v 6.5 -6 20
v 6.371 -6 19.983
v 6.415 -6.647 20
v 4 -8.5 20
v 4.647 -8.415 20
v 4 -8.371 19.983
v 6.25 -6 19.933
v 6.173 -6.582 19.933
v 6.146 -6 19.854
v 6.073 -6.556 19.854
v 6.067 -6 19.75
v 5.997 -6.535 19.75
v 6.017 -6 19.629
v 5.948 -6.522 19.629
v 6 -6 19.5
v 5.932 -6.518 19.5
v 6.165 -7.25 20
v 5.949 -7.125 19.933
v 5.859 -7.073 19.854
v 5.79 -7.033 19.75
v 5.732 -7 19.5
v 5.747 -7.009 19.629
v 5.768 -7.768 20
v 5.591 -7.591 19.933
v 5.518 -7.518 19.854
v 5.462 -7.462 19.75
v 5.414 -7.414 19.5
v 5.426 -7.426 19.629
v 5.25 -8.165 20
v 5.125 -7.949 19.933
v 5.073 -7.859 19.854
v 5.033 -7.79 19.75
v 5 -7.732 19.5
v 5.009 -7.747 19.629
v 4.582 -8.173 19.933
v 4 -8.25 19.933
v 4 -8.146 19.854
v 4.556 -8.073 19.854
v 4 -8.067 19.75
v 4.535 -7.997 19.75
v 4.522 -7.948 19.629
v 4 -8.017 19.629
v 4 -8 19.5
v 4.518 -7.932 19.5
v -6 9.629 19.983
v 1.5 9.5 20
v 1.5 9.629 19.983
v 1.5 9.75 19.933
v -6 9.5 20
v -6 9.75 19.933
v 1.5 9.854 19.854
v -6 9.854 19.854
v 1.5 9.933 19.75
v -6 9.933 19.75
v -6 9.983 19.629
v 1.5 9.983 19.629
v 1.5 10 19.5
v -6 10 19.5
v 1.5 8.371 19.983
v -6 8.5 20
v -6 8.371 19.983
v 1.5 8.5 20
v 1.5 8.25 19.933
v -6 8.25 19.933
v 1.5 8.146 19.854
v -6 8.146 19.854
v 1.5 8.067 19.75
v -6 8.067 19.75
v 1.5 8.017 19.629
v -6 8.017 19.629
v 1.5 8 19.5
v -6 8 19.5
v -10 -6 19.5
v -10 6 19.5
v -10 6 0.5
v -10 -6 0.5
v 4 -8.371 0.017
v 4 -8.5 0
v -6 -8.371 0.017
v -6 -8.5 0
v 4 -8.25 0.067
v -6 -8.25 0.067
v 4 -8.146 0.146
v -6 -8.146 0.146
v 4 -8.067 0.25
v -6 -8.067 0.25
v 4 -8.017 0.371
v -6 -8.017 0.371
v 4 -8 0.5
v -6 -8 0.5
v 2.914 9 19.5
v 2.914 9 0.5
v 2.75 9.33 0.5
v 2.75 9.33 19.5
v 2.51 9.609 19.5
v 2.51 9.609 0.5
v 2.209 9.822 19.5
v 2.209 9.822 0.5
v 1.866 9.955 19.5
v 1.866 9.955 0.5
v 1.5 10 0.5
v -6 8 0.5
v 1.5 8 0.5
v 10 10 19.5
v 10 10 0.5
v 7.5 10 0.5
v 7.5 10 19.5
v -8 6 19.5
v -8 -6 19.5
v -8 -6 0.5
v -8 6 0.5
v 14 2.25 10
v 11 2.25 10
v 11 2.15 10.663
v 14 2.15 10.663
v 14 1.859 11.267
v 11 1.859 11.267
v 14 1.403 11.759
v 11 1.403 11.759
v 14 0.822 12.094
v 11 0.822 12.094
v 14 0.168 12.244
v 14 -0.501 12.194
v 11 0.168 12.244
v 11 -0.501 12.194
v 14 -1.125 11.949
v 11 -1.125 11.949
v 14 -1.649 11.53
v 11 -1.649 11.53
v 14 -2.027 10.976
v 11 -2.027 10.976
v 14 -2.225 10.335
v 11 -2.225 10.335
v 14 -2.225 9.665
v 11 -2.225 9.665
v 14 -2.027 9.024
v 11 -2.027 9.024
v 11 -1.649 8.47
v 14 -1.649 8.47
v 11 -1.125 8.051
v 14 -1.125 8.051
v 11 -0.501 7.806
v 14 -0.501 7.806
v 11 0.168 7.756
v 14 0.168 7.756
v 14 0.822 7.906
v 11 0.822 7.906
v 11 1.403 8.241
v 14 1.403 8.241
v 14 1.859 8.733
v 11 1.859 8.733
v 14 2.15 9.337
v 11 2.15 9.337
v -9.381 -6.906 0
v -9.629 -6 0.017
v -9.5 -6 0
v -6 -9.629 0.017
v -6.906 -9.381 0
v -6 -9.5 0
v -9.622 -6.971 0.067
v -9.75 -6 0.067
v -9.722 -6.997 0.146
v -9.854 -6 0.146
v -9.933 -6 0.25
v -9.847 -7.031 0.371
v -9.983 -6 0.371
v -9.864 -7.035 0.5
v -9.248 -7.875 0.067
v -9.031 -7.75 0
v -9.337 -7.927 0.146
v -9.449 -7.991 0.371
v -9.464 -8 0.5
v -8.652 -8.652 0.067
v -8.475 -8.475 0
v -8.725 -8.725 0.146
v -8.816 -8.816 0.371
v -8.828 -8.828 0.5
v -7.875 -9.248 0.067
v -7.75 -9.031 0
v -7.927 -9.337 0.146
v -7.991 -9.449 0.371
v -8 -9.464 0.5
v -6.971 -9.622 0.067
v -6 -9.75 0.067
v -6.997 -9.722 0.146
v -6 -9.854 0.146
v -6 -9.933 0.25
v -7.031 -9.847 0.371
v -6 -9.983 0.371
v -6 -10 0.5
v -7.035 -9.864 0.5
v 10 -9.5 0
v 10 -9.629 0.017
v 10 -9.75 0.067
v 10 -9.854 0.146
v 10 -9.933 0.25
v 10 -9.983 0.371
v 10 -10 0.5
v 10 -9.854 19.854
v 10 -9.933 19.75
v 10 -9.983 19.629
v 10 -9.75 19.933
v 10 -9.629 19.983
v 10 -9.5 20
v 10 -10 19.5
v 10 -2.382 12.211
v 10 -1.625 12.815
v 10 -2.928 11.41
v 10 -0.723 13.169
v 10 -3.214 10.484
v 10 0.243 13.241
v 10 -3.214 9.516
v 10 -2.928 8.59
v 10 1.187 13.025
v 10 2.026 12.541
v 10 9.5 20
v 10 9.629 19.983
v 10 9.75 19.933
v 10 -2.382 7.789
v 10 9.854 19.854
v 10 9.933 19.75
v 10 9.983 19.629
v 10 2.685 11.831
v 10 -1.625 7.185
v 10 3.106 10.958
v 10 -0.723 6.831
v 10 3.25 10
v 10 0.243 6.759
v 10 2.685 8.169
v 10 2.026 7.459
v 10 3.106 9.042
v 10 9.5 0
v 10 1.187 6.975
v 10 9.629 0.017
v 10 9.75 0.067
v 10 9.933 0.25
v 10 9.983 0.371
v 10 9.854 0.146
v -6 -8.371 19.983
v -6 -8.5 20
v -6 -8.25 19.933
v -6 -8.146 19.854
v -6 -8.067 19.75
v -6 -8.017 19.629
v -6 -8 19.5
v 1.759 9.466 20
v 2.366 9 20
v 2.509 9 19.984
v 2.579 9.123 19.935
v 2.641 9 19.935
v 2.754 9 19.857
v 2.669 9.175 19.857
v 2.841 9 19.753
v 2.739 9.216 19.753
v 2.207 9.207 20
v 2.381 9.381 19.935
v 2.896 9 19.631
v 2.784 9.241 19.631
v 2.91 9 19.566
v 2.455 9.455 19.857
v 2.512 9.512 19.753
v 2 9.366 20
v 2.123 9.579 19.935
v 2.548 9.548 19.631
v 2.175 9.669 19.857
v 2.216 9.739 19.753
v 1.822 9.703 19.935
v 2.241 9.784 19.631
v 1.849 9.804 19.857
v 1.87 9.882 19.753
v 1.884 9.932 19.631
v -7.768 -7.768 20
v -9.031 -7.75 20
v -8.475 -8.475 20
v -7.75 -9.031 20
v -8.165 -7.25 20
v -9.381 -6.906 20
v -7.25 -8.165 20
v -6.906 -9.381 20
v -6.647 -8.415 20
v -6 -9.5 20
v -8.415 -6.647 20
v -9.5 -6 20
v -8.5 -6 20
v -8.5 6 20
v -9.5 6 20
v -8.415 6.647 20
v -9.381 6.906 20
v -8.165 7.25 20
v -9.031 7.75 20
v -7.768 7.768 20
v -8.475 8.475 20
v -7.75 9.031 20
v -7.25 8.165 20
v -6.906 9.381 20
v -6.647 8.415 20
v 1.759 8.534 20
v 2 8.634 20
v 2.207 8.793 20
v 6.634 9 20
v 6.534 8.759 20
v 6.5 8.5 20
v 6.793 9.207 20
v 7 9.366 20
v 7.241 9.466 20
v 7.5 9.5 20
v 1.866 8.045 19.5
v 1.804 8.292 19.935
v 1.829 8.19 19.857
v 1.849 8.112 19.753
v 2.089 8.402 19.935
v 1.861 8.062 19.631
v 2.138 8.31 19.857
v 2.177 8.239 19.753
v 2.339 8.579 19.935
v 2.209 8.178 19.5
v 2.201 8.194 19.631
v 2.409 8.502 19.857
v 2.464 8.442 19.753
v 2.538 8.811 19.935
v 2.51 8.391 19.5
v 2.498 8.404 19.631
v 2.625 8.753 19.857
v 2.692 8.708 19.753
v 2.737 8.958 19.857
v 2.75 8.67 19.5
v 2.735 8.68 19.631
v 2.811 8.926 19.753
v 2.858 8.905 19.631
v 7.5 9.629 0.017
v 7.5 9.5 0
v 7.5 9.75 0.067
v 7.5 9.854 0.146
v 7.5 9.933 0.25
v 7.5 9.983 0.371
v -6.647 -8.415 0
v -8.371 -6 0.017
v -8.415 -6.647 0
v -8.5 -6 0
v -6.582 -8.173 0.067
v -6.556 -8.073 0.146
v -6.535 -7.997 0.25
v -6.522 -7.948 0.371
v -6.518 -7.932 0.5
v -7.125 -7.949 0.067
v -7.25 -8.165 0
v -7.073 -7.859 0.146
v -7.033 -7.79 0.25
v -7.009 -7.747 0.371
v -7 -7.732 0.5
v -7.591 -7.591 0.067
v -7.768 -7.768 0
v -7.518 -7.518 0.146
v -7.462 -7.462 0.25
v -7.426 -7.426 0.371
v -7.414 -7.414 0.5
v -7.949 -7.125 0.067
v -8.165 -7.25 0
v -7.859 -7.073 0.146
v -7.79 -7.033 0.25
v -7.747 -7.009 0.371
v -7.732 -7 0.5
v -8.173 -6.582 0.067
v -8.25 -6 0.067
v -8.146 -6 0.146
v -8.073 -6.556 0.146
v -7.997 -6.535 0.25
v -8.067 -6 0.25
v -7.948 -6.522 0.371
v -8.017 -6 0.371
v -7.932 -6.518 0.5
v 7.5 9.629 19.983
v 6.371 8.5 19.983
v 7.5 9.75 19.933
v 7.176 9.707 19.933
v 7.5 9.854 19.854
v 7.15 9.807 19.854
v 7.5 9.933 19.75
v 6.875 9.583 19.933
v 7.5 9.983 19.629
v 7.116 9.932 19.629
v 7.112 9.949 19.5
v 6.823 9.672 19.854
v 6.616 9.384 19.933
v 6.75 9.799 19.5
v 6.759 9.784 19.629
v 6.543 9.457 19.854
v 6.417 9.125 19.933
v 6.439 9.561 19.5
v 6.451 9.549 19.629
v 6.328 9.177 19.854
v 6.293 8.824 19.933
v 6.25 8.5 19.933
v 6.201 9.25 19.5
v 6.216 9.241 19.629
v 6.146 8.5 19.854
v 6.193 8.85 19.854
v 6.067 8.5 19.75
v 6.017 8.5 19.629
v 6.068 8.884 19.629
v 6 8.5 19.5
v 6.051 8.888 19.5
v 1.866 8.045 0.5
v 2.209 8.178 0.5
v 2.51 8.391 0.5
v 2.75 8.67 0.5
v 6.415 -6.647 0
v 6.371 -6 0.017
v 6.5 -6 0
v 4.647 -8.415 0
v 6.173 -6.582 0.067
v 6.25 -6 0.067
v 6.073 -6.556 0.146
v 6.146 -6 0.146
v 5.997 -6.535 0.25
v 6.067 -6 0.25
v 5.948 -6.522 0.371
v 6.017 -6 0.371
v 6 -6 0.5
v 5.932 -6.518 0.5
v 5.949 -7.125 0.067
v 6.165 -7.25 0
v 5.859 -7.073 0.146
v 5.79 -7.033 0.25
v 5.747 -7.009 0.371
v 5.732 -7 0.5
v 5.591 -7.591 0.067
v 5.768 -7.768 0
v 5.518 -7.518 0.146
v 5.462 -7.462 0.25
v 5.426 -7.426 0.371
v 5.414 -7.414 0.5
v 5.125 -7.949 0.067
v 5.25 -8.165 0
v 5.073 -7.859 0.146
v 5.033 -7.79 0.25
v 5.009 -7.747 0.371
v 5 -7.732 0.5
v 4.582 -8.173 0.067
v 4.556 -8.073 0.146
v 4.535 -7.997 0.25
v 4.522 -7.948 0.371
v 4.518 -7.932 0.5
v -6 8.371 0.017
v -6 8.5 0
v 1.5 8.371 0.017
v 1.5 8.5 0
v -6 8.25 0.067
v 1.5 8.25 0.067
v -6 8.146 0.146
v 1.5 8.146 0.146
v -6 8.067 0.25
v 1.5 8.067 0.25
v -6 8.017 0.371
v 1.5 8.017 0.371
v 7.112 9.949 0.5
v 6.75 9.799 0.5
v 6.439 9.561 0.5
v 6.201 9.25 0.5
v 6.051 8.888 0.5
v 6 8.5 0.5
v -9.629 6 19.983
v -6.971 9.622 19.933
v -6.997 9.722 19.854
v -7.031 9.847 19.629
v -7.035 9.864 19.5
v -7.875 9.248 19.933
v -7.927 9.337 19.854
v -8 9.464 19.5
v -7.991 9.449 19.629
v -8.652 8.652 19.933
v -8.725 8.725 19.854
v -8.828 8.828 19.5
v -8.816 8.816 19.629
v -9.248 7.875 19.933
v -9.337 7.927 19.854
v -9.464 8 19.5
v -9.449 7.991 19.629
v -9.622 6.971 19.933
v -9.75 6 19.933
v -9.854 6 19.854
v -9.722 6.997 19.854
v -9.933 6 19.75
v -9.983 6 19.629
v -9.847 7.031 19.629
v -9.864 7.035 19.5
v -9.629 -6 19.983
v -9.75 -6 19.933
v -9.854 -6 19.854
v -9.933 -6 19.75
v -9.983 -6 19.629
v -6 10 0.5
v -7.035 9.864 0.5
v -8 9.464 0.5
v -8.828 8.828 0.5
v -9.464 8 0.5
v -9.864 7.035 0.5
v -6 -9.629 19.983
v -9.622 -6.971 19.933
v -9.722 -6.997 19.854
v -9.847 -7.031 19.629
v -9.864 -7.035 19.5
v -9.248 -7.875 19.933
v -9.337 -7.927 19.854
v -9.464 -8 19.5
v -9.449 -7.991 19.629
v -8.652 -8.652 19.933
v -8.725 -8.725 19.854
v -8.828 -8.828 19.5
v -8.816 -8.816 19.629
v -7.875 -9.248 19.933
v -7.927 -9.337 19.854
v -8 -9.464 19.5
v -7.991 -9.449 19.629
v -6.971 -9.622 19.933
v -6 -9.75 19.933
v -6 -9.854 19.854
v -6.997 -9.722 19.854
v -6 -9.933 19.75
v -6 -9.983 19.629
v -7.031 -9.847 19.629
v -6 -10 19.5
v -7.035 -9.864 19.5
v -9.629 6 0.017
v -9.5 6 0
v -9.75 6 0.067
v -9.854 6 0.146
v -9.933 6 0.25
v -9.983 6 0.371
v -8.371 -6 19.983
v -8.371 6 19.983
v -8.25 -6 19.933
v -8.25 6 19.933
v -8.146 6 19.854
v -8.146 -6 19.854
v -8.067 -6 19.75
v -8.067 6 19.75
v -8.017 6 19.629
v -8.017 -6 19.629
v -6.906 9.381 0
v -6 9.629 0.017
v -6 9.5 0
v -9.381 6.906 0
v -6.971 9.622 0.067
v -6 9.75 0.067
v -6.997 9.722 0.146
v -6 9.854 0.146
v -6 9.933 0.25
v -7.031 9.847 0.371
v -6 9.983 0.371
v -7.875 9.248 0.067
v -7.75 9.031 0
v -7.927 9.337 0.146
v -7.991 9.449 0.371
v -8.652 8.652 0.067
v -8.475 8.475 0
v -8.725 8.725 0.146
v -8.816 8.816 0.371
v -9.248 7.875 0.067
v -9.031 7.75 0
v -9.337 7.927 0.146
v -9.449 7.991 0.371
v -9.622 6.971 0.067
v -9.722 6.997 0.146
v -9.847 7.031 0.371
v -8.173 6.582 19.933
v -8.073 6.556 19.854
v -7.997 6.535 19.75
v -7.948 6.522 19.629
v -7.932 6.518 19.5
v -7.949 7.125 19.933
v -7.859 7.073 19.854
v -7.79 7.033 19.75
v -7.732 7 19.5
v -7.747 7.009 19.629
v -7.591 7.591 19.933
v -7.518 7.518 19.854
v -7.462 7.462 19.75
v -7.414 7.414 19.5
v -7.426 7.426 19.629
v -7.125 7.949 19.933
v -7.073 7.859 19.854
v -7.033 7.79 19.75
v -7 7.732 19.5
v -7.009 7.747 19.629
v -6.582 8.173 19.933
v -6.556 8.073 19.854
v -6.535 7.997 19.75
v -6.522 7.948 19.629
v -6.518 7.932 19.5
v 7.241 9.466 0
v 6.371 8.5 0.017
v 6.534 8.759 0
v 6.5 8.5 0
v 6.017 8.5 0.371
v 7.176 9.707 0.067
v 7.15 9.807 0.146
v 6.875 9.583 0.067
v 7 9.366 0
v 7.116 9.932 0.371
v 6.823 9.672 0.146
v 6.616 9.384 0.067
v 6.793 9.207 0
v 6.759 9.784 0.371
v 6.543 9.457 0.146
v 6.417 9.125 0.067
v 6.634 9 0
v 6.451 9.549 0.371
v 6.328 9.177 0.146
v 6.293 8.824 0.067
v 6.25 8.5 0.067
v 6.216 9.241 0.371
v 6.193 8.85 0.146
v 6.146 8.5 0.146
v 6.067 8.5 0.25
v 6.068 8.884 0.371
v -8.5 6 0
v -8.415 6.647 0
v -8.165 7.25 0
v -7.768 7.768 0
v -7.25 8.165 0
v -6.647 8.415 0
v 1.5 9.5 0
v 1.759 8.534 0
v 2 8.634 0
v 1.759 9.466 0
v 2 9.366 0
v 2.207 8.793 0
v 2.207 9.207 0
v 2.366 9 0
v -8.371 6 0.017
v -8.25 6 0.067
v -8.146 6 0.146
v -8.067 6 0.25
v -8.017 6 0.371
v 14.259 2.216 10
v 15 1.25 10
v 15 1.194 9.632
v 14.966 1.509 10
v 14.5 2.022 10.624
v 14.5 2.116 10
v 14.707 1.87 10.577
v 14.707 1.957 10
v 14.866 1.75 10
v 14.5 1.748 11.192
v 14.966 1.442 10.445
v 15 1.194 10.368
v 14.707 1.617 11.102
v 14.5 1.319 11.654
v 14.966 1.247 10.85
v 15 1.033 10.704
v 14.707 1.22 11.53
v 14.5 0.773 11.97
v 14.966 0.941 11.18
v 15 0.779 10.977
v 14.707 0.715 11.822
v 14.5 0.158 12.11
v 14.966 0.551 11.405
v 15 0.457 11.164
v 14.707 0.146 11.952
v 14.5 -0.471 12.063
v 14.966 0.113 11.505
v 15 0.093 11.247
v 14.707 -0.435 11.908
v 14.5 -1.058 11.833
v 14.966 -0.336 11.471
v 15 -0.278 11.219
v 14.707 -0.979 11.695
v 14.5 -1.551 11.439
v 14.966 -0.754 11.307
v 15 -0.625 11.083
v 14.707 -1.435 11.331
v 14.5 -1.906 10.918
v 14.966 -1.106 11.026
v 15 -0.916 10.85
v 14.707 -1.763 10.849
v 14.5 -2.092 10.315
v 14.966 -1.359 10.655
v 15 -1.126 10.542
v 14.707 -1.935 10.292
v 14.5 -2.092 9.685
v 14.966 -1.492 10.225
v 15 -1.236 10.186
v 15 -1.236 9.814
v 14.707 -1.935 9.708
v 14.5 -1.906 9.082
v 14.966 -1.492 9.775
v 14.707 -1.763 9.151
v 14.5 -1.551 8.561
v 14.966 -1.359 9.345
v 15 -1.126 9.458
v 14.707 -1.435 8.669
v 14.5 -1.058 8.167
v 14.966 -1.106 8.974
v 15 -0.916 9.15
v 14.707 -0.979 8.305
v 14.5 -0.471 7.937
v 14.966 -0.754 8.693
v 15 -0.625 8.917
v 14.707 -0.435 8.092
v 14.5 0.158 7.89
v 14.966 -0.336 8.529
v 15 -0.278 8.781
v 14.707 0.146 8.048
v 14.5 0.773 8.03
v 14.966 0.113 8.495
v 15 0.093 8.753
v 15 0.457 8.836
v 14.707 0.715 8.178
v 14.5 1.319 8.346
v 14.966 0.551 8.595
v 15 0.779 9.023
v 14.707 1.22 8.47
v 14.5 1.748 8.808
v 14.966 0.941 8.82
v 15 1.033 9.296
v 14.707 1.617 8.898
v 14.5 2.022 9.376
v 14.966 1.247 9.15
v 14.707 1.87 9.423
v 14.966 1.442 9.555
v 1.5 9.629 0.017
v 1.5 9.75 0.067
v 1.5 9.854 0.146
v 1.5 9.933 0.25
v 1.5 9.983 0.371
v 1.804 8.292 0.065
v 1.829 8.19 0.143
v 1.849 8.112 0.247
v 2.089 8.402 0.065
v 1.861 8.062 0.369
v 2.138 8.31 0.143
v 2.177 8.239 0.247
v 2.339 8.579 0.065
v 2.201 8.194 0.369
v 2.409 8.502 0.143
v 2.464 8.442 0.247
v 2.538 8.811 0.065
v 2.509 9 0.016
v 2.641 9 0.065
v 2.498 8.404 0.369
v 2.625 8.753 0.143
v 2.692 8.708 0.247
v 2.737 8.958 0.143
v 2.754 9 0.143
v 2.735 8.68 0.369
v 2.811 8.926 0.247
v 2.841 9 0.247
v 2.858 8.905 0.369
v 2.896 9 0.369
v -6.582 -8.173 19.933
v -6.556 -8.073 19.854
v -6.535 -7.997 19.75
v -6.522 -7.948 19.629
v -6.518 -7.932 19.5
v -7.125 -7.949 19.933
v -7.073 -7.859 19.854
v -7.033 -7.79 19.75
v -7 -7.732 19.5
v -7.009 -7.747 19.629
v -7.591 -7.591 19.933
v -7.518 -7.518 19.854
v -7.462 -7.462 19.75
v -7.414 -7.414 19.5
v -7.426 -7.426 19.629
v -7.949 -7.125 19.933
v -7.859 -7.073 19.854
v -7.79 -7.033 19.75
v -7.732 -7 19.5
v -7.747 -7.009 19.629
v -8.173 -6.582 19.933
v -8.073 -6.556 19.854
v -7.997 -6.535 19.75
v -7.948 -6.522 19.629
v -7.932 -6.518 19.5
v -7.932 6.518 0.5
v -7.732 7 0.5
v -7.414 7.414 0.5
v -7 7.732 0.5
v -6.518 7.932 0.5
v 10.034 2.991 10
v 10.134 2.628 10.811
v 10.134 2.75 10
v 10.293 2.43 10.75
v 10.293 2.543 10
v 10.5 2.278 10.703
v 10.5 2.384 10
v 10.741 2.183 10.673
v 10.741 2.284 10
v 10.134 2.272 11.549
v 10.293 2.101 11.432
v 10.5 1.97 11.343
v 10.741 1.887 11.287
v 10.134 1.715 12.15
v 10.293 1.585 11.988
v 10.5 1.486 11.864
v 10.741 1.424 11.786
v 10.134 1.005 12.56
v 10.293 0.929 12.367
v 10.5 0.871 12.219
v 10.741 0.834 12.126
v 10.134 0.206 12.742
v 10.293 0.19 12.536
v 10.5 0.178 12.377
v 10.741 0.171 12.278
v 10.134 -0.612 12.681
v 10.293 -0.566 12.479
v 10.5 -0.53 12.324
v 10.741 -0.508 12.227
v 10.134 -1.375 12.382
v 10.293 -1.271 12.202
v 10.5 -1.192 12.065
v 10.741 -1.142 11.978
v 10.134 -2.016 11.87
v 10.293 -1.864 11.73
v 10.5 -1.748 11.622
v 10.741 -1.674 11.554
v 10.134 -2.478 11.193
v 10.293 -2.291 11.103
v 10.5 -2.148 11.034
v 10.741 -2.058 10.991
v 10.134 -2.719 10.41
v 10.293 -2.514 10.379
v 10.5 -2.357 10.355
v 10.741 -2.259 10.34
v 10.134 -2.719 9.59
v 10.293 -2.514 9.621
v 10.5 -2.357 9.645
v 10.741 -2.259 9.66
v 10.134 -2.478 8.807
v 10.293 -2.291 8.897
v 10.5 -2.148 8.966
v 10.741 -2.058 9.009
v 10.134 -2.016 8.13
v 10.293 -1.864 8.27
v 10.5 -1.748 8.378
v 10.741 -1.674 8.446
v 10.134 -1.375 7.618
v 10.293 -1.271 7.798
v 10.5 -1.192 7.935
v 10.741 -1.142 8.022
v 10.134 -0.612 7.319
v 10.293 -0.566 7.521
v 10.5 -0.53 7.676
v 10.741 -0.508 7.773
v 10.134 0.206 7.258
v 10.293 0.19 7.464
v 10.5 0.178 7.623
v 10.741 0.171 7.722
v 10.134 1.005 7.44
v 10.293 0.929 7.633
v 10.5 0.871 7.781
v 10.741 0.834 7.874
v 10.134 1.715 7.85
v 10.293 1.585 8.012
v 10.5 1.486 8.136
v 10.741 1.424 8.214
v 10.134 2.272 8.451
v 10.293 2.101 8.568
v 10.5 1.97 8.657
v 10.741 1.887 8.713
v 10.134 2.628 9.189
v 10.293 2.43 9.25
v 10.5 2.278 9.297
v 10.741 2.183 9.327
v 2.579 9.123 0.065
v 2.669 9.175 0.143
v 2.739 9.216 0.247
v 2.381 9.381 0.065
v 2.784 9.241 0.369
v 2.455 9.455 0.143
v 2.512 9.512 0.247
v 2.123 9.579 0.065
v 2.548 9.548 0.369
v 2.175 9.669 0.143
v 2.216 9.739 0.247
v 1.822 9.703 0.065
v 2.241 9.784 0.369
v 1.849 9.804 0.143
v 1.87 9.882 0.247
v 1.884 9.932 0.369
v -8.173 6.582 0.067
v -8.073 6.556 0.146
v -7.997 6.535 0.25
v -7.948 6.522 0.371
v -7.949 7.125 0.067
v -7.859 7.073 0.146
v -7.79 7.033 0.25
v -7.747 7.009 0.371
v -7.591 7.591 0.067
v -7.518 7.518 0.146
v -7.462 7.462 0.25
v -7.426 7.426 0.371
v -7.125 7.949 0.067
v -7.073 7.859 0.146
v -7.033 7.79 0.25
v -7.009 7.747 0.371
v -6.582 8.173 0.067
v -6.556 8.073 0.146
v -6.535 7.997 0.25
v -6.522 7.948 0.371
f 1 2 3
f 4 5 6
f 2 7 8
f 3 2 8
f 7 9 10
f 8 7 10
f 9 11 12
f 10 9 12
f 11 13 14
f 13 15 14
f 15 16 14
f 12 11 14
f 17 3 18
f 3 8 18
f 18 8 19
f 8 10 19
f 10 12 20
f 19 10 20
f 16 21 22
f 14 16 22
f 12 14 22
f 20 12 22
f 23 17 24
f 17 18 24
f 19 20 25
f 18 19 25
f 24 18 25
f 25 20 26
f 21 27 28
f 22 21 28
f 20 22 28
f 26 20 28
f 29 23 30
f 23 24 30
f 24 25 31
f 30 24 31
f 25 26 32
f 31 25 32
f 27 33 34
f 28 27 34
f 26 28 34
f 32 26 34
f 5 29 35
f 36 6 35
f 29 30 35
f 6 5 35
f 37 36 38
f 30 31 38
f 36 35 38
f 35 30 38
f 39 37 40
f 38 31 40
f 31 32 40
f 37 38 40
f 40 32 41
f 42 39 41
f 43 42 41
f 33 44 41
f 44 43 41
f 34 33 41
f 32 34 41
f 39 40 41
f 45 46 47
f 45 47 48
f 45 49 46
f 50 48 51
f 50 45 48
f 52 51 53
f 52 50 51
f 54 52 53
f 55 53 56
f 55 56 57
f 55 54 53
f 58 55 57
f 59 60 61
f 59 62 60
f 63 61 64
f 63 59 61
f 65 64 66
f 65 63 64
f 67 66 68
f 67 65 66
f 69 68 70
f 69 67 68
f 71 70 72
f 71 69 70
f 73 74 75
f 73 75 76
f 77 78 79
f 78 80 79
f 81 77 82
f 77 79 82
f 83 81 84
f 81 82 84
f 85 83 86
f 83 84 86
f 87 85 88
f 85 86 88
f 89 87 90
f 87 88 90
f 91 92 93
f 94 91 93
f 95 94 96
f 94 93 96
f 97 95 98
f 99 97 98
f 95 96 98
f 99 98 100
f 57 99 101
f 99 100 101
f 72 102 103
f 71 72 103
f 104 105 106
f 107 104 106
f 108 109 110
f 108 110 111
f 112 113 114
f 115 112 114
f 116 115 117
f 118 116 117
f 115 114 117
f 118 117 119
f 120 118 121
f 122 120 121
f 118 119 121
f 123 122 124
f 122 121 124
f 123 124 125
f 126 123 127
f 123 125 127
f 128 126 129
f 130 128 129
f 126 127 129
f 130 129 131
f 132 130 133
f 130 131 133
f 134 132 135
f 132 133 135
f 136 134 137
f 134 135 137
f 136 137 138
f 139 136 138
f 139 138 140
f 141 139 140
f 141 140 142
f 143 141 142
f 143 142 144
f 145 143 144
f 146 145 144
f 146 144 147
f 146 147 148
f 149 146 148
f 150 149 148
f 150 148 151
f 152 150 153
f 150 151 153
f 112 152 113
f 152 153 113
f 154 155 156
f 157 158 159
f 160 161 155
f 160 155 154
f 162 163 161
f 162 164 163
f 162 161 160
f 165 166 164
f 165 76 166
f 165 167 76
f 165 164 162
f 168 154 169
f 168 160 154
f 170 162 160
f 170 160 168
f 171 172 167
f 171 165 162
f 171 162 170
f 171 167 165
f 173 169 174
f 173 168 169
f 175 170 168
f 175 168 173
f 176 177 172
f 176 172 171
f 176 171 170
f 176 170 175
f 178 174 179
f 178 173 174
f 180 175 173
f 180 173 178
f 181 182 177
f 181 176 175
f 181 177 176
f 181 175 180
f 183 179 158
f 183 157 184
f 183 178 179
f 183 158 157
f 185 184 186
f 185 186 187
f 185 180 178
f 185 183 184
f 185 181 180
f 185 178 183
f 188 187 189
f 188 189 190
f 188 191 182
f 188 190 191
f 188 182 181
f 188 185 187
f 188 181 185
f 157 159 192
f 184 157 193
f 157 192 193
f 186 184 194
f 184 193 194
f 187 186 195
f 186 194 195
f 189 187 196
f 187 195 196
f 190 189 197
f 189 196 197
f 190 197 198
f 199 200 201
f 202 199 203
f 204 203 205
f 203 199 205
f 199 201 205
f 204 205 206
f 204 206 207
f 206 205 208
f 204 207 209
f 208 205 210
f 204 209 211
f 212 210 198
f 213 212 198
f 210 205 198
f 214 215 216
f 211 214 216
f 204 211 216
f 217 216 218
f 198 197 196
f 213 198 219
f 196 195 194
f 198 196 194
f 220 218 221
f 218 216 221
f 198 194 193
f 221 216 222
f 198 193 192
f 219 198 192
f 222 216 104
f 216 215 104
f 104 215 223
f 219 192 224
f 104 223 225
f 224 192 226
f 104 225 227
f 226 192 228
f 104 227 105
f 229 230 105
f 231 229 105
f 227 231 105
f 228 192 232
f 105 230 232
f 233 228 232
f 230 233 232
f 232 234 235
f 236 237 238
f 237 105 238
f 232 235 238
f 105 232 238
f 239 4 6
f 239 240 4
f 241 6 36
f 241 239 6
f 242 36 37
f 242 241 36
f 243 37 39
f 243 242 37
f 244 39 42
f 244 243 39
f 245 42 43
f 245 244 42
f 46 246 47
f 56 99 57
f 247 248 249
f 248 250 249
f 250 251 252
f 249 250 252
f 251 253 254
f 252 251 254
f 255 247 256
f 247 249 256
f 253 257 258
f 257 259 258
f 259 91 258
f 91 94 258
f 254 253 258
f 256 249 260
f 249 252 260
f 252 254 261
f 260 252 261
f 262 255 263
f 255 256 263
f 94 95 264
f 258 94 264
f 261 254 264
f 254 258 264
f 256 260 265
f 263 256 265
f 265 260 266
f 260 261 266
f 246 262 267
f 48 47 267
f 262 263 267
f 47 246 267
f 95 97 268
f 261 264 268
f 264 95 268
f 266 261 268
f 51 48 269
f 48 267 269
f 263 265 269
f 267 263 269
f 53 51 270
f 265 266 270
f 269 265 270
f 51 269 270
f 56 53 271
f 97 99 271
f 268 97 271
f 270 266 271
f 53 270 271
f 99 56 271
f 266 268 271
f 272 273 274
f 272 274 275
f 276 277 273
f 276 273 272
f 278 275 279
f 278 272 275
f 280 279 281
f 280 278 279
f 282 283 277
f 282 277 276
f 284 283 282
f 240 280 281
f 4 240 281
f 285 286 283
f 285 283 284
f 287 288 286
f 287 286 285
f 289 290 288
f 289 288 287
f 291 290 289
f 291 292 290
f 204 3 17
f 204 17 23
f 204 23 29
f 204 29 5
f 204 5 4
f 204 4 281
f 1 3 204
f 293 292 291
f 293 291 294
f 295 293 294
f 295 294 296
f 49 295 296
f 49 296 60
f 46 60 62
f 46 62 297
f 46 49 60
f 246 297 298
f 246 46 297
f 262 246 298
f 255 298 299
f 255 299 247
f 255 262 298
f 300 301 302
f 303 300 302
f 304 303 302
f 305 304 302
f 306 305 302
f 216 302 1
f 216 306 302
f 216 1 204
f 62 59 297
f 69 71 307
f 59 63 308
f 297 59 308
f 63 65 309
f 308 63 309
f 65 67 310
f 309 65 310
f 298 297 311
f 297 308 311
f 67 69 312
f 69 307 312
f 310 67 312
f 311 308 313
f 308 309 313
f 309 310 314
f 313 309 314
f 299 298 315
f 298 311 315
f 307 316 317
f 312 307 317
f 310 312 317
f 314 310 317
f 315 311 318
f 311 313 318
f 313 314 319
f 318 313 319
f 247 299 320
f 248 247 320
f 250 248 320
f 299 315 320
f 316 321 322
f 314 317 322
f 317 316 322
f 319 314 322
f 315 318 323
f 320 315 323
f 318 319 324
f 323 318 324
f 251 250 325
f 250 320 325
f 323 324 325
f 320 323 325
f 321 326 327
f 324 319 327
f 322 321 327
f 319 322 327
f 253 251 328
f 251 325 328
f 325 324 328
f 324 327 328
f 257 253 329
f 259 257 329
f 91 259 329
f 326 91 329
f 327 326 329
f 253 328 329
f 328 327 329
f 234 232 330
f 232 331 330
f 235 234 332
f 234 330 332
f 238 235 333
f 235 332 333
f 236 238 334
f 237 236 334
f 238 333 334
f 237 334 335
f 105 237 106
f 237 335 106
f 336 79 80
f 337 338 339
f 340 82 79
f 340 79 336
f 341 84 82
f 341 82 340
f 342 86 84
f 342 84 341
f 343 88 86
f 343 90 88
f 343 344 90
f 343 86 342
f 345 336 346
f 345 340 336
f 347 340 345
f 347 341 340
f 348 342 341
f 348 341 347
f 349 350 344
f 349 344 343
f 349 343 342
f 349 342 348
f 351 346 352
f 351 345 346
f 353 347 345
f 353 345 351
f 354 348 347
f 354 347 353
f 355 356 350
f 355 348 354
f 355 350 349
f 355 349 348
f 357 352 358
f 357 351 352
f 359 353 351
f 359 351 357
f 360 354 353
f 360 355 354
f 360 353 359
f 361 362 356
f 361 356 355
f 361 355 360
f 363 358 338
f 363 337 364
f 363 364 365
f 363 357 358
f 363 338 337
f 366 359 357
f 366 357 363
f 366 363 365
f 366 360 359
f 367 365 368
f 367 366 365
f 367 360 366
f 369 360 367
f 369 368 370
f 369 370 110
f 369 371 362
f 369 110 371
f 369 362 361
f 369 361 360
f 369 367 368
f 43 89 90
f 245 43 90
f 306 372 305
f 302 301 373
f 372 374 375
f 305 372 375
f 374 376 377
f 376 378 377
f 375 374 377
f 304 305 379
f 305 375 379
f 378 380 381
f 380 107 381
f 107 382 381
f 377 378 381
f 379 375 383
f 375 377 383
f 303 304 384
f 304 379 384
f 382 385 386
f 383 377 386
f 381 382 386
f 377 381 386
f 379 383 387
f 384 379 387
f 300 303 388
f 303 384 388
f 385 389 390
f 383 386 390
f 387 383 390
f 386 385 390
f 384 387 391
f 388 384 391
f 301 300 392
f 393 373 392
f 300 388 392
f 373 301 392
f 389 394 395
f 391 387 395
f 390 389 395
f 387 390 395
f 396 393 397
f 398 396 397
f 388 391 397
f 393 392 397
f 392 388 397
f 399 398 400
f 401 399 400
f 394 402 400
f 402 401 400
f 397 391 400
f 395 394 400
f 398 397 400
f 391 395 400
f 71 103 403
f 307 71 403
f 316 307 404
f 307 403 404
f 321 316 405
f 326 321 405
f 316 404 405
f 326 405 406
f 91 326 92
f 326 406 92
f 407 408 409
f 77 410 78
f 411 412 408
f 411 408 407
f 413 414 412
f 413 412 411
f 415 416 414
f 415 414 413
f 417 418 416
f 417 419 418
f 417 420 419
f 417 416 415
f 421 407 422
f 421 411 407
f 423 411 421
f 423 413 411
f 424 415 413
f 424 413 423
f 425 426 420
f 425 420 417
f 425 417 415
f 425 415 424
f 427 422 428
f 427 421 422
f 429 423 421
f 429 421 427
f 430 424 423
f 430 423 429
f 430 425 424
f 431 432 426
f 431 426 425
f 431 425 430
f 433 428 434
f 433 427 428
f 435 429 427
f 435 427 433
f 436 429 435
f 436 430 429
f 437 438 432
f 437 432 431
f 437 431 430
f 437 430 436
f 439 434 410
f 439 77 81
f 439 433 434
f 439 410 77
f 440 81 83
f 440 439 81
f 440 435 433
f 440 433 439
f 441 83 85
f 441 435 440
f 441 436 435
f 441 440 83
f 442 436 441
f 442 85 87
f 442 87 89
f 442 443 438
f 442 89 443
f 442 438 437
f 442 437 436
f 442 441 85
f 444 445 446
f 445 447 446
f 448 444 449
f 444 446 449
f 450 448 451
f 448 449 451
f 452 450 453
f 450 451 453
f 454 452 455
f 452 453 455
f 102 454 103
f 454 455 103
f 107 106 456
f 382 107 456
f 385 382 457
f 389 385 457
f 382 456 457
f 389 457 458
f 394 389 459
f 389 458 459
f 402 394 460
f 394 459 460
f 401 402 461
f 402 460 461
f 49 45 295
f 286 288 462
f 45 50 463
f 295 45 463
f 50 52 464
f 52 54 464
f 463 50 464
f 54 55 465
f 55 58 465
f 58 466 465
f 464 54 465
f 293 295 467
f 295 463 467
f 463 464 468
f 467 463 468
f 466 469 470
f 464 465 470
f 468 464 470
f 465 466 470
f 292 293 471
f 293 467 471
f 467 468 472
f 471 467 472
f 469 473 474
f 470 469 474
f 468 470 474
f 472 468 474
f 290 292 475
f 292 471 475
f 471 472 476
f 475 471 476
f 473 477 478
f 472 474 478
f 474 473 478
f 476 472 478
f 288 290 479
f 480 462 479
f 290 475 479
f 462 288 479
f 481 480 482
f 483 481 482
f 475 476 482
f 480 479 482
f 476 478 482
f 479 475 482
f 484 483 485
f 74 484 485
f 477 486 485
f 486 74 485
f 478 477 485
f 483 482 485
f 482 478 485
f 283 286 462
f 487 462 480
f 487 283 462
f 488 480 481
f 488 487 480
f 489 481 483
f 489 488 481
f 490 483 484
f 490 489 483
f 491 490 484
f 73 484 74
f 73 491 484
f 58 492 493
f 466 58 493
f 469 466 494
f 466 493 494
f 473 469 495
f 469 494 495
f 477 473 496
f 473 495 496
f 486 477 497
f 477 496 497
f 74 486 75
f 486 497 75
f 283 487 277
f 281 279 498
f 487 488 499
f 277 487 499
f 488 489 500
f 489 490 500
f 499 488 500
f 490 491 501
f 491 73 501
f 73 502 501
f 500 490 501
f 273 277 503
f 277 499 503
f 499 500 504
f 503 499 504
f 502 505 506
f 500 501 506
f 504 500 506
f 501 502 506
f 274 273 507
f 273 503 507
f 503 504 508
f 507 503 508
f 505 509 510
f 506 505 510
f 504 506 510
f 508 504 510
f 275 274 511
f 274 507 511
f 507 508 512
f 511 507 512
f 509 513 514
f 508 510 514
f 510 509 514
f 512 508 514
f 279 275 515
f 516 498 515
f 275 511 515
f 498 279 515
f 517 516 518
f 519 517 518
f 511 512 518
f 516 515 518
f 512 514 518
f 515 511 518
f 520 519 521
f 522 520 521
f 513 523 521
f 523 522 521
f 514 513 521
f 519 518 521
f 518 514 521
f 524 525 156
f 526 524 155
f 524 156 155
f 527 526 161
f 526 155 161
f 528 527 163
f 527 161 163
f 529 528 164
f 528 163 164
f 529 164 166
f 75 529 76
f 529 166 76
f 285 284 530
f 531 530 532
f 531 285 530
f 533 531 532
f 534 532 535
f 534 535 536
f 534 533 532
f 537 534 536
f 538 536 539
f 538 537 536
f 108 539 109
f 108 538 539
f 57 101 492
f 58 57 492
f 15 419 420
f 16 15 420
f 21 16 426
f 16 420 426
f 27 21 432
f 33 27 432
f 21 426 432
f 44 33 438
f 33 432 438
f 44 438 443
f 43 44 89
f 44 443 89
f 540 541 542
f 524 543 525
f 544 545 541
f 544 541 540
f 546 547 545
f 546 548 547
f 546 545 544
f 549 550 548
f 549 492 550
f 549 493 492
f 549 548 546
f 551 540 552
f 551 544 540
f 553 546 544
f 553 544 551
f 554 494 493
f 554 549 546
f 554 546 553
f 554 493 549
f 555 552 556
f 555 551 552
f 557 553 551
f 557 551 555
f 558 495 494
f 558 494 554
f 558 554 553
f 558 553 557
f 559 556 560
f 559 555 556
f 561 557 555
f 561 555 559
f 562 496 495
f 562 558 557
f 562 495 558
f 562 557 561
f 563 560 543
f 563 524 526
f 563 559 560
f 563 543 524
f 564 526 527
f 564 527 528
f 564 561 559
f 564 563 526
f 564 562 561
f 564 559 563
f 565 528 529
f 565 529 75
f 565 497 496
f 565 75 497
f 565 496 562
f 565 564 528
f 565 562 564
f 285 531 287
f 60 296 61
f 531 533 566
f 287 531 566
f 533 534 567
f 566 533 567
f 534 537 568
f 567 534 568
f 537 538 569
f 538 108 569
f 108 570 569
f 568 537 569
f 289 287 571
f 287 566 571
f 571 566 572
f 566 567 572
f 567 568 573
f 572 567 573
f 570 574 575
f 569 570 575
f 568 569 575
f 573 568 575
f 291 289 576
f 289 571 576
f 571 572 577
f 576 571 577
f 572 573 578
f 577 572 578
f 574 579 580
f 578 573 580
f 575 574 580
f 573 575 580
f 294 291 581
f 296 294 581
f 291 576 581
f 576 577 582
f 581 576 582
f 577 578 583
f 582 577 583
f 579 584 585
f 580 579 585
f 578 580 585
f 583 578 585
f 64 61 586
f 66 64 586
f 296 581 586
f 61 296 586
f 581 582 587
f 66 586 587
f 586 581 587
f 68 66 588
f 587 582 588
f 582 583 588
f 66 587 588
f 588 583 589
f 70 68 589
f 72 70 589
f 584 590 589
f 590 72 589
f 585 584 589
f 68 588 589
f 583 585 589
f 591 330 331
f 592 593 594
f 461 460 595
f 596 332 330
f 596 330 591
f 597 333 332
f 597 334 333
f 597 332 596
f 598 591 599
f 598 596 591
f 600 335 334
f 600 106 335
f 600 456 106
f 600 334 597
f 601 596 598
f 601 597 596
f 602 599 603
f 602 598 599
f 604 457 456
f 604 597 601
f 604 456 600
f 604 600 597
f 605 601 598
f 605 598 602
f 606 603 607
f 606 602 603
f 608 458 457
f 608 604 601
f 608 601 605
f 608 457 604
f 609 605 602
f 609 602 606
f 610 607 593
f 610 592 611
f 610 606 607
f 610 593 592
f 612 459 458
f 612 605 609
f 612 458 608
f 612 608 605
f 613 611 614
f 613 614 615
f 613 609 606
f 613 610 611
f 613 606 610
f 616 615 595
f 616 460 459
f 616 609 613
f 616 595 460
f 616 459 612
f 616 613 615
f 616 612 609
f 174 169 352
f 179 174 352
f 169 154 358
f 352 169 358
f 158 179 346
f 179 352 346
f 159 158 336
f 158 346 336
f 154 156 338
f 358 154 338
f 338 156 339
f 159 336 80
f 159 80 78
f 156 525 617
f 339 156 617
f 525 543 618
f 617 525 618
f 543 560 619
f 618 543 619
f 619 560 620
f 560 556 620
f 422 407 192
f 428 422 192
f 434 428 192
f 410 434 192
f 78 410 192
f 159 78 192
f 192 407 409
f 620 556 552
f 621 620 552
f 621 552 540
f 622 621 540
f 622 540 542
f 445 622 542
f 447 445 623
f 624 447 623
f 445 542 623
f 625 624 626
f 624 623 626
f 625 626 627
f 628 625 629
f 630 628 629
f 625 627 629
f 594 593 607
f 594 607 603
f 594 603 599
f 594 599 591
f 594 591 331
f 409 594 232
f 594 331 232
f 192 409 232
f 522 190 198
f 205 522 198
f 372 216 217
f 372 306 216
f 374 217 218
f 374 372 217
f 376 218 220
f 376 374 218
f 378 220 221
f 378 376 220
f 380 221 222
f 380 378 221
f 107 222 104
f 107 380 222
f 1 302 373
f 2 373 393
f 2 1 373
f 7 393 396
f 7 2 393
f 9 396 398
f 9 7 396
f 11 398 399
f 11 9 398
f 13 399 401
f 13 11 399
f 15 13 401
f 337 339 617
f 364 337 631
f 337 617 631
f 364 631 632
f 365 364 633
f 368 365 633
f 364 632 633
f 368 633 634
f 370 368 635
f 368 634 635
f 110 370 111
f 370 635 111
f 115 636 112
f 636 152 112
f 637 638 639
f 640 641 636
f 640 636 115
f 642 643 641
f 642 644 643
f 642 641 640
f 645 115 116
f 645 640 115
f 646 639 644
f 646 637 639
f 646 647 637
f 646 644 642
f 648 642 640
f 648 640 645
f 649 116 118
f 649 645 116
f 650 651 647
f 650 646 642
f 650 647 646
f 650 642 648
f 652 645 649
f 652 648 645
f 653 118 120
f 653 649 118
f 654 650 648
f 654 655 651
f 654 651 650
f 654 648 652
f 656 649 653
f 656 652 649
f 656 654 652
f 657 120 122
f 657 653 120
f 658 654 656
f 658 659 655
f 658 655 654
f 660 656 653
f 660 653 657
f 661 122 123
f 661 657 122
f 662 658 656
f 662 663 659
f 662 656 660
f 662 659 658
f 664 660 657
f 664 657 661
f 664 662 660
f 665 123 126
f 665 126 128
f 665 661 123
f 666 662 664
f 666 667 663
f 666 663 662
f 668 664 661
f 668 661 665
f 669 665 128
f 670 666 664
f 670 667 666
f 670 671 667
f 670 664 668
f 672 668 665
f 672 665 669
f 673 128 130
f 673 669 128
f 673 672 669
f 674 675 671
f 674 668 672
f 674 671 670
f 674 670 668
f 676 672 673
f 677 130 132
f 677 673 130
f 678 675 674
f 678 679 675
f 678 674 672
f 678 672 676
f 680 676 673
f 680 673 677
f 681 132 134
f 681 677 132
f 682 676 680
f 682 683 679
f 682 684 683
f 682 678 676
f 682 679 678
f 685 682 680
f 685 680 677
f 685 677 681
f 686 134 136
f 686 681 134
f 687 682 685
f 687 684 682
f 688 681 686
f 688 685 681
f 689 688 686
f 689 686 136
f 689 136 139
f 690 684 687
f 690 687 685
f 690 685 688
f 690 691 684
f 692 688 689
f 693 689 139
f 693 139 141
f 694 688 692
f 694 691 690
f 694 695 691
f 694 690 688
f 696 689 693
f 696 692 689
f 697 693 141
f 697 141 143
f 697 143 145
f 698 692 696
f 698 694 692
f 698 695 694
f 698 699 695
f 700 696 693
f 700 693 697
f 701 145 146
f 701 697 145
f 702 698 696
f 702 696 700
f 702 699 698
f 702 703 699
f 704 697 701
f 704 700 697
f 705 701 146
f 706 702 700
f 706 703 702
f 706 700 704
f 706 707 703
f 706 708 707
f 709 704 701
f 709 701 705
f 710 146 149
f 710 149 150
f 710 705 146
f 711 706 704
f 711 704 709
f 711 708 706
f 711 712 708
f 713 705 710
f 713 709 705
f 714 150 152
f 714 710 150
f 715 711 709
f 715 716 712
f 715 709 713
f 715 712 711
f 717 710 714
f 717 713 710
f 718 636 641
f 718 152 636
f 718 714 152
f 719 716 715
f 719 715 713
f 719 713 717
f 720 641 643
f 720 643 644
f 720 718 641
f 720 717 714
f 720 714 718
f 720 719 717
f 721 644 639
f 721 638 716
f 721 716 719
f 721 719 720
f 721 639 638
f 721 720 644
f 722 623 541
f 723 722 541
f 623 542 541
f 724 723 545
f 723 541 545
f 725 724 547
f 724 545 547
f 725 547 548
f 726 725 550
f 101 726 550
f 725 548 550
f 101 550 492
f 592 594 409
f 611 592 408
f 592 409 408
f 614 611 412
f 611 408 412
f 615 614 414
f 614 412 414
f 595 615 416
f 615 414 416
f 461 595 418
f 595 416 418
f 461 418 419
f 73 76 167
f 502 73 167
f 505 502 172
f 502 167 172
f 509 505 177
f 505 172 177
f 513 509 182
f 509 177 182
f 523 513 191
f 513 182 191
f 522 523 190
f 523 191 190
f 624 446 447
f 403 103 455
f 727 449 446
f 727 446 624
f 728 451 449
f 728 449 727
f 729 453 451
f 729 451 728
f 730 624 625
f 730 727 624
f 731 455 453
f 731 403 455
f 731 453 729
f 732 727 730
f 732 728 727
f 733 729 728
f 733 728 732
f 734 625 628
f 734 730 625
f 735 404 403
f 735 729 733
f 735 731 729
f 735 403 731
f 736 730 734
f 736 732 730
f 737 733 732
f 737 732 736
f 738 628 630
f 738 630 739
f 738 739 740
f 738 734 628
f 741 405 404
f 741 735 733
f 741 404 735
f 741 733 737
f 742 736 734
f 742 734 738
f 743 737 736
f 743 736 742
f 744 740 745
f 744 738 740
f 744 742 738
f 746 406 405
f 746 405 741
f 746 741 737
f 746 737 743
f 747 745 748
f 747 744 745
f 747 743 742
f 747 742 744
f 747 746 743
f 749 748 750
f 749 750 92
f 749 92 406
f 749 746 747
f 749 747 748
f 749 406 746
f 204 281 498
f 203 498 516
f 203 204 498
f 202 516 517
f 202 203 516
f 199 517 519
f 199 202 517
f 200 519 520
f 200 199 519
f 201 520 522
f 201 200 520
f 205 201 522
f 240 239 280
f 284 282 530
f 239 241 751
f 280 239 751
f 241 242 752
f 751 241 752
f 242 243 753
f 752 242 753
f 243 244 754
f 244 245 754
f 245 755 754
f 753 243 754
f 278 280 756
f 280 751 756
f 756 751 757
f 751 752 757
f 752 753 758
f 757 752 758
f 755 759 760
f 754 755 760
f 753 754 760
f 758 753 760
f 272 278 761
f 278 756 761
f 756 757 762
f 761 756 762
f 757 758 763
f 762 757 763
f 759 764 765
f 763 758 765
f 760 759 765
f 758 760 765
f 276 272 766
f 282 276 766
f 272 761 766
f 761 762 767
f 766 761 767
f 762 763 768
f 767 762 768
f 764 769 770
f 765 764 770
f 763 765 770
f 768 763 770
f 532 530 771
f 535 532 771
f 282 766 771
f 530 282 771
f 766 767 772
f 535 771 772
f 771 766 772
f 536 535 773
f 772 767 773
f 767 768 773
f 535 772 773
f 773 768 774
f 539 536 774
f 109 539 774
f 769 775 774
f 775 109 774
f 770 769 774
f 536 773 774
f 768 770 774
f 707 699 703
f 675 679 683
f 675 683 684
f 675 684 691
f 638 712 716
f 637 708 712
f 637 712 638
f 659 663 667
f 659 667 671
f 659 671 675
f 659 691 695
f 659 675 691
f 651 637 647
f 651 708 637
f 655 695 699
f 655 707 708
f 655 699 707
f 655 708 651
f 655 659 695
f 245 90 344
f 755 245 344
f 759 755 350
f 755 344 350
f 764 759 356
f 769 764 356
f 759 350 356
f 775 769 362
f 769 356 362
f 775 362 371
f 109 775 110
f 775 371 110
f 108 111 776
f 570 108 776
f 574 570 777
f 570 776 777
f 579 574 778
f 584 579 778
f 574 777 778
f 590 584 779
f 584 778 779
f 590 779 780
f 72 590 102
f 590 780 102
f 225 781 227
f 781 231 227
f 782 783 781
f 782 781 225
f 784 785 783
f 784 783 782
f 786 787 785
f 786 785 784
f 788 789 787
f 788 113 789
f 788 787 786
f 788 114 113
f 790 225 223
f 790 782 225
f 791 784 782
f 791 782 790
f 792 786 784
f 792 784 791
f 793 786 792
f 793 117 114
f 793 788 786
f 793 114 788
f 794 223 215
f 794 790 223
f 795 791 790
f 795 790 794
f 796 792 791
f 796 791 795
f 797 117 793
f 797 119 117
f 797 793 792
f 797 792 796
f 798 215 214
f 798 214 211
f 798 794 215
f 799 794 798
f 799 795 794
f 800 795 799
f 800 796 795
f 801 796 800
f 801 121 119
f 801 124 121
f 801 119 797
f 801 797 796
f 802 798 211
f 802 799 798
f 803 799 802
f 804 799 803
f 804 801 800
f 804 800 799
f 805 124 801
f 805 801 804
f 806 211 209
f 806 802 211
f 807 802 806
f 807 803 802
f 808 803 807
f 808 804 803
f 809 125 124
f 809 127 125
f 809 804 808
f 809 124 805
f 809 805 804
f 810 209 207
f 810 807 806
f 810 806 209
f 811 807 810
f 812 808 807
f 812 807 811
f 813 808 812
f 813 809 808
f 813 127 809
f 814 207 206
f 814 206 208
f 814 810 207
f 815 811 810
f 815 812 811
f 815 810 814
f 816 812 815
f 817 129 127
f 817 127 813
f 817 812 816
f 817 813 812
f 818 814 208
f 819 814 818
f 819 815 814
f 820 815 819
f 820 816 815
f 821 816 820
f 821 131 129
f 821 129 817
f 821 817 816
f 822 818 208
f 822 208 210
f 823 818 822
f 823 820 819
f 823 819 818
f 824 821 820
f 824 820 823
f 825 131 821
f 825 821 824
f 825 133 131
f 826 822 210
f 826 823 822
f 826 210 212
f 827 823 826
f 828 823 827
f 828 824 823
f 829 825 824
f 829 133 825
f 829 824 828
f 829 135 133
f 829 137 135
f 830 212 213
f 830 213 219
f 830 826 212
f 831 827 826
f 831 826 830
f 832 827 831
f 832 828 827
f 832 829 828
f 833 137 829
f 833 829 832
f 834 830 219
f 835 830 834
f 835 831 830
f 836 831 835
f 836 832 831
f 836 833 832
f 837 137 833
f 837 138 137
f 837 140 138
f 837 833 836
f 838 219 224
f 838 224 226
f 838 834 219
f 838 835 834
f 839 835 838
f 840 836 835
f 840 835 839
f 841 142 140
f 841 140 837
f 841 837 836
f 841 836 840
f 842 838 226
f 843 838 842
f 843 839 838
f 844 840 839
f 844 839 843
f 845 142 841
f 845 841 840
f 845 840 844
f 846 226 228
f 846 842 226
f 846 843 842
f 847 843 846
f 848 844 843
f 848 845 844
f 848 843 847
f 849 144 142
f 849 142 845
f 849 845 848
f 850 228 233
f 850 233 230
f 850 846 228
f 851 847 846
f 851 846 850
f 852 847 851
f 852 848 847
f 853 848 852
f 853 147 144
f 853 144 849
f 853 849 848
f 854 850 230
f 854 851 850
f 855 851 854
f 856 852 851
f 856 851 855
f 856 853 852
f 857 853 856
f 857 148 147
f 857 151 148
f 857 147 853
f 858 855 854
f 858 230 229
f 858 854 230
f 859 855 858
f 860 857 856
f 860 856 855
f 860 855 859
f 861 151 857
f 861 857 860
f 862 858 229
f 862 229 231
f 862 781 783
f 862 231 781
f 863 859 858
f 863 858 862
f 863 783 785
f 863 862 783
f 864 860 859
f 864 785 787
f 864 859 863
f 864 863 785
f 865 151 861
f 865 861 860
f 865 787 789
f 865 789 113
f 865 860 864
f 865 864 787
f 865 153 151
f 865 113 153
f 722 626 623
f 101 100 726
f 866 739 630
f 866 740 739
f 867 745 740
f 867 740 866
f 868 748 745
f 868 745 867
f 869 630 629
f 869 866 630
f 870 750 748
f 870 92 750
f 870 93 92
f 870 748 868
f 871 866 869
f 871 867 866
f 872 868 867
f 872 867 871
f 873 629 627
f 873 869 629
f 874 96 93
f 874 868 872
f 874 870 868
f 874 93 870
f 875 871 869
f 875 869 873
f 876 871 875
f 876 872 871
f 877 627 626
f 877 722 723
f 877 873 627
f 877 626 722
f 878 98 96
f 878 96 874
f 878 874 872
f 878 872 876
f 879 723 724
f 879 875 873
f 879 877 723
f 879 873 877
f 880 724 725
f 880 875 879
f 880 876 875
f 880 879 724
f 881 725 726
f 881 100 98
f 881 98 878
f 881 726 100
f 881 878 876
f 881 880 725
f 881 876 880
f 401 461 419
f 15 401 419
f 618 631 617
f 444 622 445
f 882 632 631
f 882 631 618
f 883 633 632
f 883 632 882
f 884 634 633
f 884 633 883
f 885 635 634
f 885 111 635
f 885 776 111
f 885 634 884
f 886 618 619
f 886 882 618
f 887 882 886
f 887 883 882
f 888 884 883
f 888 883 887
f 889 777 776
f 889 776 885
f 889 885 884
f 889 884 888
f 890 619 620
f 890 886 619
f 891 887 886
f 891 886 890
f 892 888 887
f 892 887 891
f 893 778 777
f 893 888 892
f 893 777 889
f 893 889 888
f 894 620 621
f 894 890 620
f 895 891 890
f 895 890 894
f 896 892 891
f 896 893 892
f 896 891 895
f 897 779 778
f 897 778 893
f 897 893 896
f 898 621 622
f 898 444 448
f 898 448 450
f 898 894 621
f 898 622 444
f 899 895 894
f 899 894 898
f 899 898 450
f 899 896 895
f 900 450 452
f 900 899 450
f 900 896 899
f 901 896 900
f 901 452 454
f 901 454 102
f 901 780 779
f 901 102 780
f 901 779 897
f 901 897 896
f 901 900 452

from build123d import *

# Parameters (mm, degrees)
F1_DEPTH = 20
F2_R     = 2.25
F3_DEPTH = 5
F4_R     = 1
F5_R     = 0.5


with BuildPart() as f1:
    # F0 (on Top) → F1 (new body)
    with BuildSketch(Plane.XY):
        with BuildLine():
            Line((-6, -10), (10, -10))
            Line((10, -10), (10, 10))
            Line((10, 10), (7.5, 10))
            ThreePointArc((7.5, 10), (6.43934, 9.56066), (6, 8.5))
            Line((6, 8.5), (6, -6))
            ThreePointArc((6, -6), (5.414214, -7.414214), (4, -8))
            Line((4, -8), (-6, -8))
            ThreePointArc((-6, -8), (-7.414214, -7.414214), (-8, -6))
            Line((-8, -6), (-8, 6))
            ThreePointArc((-8, 6), (-7.414214, 7.414214), (-6, 8))
            Line((-6, 8), (1.5, 8))
            ThreePointArc((1.5, 8), (2.366025, 8.275255), (2.914214, 9))
            ThreePointArc((2.914214, 9), (2.366025, 9.724745), (1.5, 10))
            Line((1.5, 10), (-6, 10))
            ThreePointArc((-6, 10), (-8.828427, 8.828427), (-10, 6))
            Line((-10, 6), (-10, -6))
            ThreePointArc((-10, -6), (-8.828427, -8.828427), (-6, -10))
        make_face()
    extrude(amount=F1_DEPTH)

    # F2 (on face) → F3 (join)
    with BuildSketch(Plane.YZ.offset(10)):
        with Locations((0, 10)):
            Circle(F2_R)
    extrude(amount=F3_DEPTH)

    # F4
    f4_edges = [f1.edges().sort_by_distance(p)[0] for p in [
        (15, -2.25, 10),
        (10, -2.25, 10),
    ]]
    fillet(f4_edges, radius=F4_R)

    # F5
    f5_edges = [f1.edges().sort_by_distance(p)[0] for p in [
        (-8, 0, 20),
        (-8, 0, 0),
        (-10, 0, 20),
        (-10, 0, 0),
    ]]
    fillet(f5_edges, radius=F5_R)


solid = f1.part
